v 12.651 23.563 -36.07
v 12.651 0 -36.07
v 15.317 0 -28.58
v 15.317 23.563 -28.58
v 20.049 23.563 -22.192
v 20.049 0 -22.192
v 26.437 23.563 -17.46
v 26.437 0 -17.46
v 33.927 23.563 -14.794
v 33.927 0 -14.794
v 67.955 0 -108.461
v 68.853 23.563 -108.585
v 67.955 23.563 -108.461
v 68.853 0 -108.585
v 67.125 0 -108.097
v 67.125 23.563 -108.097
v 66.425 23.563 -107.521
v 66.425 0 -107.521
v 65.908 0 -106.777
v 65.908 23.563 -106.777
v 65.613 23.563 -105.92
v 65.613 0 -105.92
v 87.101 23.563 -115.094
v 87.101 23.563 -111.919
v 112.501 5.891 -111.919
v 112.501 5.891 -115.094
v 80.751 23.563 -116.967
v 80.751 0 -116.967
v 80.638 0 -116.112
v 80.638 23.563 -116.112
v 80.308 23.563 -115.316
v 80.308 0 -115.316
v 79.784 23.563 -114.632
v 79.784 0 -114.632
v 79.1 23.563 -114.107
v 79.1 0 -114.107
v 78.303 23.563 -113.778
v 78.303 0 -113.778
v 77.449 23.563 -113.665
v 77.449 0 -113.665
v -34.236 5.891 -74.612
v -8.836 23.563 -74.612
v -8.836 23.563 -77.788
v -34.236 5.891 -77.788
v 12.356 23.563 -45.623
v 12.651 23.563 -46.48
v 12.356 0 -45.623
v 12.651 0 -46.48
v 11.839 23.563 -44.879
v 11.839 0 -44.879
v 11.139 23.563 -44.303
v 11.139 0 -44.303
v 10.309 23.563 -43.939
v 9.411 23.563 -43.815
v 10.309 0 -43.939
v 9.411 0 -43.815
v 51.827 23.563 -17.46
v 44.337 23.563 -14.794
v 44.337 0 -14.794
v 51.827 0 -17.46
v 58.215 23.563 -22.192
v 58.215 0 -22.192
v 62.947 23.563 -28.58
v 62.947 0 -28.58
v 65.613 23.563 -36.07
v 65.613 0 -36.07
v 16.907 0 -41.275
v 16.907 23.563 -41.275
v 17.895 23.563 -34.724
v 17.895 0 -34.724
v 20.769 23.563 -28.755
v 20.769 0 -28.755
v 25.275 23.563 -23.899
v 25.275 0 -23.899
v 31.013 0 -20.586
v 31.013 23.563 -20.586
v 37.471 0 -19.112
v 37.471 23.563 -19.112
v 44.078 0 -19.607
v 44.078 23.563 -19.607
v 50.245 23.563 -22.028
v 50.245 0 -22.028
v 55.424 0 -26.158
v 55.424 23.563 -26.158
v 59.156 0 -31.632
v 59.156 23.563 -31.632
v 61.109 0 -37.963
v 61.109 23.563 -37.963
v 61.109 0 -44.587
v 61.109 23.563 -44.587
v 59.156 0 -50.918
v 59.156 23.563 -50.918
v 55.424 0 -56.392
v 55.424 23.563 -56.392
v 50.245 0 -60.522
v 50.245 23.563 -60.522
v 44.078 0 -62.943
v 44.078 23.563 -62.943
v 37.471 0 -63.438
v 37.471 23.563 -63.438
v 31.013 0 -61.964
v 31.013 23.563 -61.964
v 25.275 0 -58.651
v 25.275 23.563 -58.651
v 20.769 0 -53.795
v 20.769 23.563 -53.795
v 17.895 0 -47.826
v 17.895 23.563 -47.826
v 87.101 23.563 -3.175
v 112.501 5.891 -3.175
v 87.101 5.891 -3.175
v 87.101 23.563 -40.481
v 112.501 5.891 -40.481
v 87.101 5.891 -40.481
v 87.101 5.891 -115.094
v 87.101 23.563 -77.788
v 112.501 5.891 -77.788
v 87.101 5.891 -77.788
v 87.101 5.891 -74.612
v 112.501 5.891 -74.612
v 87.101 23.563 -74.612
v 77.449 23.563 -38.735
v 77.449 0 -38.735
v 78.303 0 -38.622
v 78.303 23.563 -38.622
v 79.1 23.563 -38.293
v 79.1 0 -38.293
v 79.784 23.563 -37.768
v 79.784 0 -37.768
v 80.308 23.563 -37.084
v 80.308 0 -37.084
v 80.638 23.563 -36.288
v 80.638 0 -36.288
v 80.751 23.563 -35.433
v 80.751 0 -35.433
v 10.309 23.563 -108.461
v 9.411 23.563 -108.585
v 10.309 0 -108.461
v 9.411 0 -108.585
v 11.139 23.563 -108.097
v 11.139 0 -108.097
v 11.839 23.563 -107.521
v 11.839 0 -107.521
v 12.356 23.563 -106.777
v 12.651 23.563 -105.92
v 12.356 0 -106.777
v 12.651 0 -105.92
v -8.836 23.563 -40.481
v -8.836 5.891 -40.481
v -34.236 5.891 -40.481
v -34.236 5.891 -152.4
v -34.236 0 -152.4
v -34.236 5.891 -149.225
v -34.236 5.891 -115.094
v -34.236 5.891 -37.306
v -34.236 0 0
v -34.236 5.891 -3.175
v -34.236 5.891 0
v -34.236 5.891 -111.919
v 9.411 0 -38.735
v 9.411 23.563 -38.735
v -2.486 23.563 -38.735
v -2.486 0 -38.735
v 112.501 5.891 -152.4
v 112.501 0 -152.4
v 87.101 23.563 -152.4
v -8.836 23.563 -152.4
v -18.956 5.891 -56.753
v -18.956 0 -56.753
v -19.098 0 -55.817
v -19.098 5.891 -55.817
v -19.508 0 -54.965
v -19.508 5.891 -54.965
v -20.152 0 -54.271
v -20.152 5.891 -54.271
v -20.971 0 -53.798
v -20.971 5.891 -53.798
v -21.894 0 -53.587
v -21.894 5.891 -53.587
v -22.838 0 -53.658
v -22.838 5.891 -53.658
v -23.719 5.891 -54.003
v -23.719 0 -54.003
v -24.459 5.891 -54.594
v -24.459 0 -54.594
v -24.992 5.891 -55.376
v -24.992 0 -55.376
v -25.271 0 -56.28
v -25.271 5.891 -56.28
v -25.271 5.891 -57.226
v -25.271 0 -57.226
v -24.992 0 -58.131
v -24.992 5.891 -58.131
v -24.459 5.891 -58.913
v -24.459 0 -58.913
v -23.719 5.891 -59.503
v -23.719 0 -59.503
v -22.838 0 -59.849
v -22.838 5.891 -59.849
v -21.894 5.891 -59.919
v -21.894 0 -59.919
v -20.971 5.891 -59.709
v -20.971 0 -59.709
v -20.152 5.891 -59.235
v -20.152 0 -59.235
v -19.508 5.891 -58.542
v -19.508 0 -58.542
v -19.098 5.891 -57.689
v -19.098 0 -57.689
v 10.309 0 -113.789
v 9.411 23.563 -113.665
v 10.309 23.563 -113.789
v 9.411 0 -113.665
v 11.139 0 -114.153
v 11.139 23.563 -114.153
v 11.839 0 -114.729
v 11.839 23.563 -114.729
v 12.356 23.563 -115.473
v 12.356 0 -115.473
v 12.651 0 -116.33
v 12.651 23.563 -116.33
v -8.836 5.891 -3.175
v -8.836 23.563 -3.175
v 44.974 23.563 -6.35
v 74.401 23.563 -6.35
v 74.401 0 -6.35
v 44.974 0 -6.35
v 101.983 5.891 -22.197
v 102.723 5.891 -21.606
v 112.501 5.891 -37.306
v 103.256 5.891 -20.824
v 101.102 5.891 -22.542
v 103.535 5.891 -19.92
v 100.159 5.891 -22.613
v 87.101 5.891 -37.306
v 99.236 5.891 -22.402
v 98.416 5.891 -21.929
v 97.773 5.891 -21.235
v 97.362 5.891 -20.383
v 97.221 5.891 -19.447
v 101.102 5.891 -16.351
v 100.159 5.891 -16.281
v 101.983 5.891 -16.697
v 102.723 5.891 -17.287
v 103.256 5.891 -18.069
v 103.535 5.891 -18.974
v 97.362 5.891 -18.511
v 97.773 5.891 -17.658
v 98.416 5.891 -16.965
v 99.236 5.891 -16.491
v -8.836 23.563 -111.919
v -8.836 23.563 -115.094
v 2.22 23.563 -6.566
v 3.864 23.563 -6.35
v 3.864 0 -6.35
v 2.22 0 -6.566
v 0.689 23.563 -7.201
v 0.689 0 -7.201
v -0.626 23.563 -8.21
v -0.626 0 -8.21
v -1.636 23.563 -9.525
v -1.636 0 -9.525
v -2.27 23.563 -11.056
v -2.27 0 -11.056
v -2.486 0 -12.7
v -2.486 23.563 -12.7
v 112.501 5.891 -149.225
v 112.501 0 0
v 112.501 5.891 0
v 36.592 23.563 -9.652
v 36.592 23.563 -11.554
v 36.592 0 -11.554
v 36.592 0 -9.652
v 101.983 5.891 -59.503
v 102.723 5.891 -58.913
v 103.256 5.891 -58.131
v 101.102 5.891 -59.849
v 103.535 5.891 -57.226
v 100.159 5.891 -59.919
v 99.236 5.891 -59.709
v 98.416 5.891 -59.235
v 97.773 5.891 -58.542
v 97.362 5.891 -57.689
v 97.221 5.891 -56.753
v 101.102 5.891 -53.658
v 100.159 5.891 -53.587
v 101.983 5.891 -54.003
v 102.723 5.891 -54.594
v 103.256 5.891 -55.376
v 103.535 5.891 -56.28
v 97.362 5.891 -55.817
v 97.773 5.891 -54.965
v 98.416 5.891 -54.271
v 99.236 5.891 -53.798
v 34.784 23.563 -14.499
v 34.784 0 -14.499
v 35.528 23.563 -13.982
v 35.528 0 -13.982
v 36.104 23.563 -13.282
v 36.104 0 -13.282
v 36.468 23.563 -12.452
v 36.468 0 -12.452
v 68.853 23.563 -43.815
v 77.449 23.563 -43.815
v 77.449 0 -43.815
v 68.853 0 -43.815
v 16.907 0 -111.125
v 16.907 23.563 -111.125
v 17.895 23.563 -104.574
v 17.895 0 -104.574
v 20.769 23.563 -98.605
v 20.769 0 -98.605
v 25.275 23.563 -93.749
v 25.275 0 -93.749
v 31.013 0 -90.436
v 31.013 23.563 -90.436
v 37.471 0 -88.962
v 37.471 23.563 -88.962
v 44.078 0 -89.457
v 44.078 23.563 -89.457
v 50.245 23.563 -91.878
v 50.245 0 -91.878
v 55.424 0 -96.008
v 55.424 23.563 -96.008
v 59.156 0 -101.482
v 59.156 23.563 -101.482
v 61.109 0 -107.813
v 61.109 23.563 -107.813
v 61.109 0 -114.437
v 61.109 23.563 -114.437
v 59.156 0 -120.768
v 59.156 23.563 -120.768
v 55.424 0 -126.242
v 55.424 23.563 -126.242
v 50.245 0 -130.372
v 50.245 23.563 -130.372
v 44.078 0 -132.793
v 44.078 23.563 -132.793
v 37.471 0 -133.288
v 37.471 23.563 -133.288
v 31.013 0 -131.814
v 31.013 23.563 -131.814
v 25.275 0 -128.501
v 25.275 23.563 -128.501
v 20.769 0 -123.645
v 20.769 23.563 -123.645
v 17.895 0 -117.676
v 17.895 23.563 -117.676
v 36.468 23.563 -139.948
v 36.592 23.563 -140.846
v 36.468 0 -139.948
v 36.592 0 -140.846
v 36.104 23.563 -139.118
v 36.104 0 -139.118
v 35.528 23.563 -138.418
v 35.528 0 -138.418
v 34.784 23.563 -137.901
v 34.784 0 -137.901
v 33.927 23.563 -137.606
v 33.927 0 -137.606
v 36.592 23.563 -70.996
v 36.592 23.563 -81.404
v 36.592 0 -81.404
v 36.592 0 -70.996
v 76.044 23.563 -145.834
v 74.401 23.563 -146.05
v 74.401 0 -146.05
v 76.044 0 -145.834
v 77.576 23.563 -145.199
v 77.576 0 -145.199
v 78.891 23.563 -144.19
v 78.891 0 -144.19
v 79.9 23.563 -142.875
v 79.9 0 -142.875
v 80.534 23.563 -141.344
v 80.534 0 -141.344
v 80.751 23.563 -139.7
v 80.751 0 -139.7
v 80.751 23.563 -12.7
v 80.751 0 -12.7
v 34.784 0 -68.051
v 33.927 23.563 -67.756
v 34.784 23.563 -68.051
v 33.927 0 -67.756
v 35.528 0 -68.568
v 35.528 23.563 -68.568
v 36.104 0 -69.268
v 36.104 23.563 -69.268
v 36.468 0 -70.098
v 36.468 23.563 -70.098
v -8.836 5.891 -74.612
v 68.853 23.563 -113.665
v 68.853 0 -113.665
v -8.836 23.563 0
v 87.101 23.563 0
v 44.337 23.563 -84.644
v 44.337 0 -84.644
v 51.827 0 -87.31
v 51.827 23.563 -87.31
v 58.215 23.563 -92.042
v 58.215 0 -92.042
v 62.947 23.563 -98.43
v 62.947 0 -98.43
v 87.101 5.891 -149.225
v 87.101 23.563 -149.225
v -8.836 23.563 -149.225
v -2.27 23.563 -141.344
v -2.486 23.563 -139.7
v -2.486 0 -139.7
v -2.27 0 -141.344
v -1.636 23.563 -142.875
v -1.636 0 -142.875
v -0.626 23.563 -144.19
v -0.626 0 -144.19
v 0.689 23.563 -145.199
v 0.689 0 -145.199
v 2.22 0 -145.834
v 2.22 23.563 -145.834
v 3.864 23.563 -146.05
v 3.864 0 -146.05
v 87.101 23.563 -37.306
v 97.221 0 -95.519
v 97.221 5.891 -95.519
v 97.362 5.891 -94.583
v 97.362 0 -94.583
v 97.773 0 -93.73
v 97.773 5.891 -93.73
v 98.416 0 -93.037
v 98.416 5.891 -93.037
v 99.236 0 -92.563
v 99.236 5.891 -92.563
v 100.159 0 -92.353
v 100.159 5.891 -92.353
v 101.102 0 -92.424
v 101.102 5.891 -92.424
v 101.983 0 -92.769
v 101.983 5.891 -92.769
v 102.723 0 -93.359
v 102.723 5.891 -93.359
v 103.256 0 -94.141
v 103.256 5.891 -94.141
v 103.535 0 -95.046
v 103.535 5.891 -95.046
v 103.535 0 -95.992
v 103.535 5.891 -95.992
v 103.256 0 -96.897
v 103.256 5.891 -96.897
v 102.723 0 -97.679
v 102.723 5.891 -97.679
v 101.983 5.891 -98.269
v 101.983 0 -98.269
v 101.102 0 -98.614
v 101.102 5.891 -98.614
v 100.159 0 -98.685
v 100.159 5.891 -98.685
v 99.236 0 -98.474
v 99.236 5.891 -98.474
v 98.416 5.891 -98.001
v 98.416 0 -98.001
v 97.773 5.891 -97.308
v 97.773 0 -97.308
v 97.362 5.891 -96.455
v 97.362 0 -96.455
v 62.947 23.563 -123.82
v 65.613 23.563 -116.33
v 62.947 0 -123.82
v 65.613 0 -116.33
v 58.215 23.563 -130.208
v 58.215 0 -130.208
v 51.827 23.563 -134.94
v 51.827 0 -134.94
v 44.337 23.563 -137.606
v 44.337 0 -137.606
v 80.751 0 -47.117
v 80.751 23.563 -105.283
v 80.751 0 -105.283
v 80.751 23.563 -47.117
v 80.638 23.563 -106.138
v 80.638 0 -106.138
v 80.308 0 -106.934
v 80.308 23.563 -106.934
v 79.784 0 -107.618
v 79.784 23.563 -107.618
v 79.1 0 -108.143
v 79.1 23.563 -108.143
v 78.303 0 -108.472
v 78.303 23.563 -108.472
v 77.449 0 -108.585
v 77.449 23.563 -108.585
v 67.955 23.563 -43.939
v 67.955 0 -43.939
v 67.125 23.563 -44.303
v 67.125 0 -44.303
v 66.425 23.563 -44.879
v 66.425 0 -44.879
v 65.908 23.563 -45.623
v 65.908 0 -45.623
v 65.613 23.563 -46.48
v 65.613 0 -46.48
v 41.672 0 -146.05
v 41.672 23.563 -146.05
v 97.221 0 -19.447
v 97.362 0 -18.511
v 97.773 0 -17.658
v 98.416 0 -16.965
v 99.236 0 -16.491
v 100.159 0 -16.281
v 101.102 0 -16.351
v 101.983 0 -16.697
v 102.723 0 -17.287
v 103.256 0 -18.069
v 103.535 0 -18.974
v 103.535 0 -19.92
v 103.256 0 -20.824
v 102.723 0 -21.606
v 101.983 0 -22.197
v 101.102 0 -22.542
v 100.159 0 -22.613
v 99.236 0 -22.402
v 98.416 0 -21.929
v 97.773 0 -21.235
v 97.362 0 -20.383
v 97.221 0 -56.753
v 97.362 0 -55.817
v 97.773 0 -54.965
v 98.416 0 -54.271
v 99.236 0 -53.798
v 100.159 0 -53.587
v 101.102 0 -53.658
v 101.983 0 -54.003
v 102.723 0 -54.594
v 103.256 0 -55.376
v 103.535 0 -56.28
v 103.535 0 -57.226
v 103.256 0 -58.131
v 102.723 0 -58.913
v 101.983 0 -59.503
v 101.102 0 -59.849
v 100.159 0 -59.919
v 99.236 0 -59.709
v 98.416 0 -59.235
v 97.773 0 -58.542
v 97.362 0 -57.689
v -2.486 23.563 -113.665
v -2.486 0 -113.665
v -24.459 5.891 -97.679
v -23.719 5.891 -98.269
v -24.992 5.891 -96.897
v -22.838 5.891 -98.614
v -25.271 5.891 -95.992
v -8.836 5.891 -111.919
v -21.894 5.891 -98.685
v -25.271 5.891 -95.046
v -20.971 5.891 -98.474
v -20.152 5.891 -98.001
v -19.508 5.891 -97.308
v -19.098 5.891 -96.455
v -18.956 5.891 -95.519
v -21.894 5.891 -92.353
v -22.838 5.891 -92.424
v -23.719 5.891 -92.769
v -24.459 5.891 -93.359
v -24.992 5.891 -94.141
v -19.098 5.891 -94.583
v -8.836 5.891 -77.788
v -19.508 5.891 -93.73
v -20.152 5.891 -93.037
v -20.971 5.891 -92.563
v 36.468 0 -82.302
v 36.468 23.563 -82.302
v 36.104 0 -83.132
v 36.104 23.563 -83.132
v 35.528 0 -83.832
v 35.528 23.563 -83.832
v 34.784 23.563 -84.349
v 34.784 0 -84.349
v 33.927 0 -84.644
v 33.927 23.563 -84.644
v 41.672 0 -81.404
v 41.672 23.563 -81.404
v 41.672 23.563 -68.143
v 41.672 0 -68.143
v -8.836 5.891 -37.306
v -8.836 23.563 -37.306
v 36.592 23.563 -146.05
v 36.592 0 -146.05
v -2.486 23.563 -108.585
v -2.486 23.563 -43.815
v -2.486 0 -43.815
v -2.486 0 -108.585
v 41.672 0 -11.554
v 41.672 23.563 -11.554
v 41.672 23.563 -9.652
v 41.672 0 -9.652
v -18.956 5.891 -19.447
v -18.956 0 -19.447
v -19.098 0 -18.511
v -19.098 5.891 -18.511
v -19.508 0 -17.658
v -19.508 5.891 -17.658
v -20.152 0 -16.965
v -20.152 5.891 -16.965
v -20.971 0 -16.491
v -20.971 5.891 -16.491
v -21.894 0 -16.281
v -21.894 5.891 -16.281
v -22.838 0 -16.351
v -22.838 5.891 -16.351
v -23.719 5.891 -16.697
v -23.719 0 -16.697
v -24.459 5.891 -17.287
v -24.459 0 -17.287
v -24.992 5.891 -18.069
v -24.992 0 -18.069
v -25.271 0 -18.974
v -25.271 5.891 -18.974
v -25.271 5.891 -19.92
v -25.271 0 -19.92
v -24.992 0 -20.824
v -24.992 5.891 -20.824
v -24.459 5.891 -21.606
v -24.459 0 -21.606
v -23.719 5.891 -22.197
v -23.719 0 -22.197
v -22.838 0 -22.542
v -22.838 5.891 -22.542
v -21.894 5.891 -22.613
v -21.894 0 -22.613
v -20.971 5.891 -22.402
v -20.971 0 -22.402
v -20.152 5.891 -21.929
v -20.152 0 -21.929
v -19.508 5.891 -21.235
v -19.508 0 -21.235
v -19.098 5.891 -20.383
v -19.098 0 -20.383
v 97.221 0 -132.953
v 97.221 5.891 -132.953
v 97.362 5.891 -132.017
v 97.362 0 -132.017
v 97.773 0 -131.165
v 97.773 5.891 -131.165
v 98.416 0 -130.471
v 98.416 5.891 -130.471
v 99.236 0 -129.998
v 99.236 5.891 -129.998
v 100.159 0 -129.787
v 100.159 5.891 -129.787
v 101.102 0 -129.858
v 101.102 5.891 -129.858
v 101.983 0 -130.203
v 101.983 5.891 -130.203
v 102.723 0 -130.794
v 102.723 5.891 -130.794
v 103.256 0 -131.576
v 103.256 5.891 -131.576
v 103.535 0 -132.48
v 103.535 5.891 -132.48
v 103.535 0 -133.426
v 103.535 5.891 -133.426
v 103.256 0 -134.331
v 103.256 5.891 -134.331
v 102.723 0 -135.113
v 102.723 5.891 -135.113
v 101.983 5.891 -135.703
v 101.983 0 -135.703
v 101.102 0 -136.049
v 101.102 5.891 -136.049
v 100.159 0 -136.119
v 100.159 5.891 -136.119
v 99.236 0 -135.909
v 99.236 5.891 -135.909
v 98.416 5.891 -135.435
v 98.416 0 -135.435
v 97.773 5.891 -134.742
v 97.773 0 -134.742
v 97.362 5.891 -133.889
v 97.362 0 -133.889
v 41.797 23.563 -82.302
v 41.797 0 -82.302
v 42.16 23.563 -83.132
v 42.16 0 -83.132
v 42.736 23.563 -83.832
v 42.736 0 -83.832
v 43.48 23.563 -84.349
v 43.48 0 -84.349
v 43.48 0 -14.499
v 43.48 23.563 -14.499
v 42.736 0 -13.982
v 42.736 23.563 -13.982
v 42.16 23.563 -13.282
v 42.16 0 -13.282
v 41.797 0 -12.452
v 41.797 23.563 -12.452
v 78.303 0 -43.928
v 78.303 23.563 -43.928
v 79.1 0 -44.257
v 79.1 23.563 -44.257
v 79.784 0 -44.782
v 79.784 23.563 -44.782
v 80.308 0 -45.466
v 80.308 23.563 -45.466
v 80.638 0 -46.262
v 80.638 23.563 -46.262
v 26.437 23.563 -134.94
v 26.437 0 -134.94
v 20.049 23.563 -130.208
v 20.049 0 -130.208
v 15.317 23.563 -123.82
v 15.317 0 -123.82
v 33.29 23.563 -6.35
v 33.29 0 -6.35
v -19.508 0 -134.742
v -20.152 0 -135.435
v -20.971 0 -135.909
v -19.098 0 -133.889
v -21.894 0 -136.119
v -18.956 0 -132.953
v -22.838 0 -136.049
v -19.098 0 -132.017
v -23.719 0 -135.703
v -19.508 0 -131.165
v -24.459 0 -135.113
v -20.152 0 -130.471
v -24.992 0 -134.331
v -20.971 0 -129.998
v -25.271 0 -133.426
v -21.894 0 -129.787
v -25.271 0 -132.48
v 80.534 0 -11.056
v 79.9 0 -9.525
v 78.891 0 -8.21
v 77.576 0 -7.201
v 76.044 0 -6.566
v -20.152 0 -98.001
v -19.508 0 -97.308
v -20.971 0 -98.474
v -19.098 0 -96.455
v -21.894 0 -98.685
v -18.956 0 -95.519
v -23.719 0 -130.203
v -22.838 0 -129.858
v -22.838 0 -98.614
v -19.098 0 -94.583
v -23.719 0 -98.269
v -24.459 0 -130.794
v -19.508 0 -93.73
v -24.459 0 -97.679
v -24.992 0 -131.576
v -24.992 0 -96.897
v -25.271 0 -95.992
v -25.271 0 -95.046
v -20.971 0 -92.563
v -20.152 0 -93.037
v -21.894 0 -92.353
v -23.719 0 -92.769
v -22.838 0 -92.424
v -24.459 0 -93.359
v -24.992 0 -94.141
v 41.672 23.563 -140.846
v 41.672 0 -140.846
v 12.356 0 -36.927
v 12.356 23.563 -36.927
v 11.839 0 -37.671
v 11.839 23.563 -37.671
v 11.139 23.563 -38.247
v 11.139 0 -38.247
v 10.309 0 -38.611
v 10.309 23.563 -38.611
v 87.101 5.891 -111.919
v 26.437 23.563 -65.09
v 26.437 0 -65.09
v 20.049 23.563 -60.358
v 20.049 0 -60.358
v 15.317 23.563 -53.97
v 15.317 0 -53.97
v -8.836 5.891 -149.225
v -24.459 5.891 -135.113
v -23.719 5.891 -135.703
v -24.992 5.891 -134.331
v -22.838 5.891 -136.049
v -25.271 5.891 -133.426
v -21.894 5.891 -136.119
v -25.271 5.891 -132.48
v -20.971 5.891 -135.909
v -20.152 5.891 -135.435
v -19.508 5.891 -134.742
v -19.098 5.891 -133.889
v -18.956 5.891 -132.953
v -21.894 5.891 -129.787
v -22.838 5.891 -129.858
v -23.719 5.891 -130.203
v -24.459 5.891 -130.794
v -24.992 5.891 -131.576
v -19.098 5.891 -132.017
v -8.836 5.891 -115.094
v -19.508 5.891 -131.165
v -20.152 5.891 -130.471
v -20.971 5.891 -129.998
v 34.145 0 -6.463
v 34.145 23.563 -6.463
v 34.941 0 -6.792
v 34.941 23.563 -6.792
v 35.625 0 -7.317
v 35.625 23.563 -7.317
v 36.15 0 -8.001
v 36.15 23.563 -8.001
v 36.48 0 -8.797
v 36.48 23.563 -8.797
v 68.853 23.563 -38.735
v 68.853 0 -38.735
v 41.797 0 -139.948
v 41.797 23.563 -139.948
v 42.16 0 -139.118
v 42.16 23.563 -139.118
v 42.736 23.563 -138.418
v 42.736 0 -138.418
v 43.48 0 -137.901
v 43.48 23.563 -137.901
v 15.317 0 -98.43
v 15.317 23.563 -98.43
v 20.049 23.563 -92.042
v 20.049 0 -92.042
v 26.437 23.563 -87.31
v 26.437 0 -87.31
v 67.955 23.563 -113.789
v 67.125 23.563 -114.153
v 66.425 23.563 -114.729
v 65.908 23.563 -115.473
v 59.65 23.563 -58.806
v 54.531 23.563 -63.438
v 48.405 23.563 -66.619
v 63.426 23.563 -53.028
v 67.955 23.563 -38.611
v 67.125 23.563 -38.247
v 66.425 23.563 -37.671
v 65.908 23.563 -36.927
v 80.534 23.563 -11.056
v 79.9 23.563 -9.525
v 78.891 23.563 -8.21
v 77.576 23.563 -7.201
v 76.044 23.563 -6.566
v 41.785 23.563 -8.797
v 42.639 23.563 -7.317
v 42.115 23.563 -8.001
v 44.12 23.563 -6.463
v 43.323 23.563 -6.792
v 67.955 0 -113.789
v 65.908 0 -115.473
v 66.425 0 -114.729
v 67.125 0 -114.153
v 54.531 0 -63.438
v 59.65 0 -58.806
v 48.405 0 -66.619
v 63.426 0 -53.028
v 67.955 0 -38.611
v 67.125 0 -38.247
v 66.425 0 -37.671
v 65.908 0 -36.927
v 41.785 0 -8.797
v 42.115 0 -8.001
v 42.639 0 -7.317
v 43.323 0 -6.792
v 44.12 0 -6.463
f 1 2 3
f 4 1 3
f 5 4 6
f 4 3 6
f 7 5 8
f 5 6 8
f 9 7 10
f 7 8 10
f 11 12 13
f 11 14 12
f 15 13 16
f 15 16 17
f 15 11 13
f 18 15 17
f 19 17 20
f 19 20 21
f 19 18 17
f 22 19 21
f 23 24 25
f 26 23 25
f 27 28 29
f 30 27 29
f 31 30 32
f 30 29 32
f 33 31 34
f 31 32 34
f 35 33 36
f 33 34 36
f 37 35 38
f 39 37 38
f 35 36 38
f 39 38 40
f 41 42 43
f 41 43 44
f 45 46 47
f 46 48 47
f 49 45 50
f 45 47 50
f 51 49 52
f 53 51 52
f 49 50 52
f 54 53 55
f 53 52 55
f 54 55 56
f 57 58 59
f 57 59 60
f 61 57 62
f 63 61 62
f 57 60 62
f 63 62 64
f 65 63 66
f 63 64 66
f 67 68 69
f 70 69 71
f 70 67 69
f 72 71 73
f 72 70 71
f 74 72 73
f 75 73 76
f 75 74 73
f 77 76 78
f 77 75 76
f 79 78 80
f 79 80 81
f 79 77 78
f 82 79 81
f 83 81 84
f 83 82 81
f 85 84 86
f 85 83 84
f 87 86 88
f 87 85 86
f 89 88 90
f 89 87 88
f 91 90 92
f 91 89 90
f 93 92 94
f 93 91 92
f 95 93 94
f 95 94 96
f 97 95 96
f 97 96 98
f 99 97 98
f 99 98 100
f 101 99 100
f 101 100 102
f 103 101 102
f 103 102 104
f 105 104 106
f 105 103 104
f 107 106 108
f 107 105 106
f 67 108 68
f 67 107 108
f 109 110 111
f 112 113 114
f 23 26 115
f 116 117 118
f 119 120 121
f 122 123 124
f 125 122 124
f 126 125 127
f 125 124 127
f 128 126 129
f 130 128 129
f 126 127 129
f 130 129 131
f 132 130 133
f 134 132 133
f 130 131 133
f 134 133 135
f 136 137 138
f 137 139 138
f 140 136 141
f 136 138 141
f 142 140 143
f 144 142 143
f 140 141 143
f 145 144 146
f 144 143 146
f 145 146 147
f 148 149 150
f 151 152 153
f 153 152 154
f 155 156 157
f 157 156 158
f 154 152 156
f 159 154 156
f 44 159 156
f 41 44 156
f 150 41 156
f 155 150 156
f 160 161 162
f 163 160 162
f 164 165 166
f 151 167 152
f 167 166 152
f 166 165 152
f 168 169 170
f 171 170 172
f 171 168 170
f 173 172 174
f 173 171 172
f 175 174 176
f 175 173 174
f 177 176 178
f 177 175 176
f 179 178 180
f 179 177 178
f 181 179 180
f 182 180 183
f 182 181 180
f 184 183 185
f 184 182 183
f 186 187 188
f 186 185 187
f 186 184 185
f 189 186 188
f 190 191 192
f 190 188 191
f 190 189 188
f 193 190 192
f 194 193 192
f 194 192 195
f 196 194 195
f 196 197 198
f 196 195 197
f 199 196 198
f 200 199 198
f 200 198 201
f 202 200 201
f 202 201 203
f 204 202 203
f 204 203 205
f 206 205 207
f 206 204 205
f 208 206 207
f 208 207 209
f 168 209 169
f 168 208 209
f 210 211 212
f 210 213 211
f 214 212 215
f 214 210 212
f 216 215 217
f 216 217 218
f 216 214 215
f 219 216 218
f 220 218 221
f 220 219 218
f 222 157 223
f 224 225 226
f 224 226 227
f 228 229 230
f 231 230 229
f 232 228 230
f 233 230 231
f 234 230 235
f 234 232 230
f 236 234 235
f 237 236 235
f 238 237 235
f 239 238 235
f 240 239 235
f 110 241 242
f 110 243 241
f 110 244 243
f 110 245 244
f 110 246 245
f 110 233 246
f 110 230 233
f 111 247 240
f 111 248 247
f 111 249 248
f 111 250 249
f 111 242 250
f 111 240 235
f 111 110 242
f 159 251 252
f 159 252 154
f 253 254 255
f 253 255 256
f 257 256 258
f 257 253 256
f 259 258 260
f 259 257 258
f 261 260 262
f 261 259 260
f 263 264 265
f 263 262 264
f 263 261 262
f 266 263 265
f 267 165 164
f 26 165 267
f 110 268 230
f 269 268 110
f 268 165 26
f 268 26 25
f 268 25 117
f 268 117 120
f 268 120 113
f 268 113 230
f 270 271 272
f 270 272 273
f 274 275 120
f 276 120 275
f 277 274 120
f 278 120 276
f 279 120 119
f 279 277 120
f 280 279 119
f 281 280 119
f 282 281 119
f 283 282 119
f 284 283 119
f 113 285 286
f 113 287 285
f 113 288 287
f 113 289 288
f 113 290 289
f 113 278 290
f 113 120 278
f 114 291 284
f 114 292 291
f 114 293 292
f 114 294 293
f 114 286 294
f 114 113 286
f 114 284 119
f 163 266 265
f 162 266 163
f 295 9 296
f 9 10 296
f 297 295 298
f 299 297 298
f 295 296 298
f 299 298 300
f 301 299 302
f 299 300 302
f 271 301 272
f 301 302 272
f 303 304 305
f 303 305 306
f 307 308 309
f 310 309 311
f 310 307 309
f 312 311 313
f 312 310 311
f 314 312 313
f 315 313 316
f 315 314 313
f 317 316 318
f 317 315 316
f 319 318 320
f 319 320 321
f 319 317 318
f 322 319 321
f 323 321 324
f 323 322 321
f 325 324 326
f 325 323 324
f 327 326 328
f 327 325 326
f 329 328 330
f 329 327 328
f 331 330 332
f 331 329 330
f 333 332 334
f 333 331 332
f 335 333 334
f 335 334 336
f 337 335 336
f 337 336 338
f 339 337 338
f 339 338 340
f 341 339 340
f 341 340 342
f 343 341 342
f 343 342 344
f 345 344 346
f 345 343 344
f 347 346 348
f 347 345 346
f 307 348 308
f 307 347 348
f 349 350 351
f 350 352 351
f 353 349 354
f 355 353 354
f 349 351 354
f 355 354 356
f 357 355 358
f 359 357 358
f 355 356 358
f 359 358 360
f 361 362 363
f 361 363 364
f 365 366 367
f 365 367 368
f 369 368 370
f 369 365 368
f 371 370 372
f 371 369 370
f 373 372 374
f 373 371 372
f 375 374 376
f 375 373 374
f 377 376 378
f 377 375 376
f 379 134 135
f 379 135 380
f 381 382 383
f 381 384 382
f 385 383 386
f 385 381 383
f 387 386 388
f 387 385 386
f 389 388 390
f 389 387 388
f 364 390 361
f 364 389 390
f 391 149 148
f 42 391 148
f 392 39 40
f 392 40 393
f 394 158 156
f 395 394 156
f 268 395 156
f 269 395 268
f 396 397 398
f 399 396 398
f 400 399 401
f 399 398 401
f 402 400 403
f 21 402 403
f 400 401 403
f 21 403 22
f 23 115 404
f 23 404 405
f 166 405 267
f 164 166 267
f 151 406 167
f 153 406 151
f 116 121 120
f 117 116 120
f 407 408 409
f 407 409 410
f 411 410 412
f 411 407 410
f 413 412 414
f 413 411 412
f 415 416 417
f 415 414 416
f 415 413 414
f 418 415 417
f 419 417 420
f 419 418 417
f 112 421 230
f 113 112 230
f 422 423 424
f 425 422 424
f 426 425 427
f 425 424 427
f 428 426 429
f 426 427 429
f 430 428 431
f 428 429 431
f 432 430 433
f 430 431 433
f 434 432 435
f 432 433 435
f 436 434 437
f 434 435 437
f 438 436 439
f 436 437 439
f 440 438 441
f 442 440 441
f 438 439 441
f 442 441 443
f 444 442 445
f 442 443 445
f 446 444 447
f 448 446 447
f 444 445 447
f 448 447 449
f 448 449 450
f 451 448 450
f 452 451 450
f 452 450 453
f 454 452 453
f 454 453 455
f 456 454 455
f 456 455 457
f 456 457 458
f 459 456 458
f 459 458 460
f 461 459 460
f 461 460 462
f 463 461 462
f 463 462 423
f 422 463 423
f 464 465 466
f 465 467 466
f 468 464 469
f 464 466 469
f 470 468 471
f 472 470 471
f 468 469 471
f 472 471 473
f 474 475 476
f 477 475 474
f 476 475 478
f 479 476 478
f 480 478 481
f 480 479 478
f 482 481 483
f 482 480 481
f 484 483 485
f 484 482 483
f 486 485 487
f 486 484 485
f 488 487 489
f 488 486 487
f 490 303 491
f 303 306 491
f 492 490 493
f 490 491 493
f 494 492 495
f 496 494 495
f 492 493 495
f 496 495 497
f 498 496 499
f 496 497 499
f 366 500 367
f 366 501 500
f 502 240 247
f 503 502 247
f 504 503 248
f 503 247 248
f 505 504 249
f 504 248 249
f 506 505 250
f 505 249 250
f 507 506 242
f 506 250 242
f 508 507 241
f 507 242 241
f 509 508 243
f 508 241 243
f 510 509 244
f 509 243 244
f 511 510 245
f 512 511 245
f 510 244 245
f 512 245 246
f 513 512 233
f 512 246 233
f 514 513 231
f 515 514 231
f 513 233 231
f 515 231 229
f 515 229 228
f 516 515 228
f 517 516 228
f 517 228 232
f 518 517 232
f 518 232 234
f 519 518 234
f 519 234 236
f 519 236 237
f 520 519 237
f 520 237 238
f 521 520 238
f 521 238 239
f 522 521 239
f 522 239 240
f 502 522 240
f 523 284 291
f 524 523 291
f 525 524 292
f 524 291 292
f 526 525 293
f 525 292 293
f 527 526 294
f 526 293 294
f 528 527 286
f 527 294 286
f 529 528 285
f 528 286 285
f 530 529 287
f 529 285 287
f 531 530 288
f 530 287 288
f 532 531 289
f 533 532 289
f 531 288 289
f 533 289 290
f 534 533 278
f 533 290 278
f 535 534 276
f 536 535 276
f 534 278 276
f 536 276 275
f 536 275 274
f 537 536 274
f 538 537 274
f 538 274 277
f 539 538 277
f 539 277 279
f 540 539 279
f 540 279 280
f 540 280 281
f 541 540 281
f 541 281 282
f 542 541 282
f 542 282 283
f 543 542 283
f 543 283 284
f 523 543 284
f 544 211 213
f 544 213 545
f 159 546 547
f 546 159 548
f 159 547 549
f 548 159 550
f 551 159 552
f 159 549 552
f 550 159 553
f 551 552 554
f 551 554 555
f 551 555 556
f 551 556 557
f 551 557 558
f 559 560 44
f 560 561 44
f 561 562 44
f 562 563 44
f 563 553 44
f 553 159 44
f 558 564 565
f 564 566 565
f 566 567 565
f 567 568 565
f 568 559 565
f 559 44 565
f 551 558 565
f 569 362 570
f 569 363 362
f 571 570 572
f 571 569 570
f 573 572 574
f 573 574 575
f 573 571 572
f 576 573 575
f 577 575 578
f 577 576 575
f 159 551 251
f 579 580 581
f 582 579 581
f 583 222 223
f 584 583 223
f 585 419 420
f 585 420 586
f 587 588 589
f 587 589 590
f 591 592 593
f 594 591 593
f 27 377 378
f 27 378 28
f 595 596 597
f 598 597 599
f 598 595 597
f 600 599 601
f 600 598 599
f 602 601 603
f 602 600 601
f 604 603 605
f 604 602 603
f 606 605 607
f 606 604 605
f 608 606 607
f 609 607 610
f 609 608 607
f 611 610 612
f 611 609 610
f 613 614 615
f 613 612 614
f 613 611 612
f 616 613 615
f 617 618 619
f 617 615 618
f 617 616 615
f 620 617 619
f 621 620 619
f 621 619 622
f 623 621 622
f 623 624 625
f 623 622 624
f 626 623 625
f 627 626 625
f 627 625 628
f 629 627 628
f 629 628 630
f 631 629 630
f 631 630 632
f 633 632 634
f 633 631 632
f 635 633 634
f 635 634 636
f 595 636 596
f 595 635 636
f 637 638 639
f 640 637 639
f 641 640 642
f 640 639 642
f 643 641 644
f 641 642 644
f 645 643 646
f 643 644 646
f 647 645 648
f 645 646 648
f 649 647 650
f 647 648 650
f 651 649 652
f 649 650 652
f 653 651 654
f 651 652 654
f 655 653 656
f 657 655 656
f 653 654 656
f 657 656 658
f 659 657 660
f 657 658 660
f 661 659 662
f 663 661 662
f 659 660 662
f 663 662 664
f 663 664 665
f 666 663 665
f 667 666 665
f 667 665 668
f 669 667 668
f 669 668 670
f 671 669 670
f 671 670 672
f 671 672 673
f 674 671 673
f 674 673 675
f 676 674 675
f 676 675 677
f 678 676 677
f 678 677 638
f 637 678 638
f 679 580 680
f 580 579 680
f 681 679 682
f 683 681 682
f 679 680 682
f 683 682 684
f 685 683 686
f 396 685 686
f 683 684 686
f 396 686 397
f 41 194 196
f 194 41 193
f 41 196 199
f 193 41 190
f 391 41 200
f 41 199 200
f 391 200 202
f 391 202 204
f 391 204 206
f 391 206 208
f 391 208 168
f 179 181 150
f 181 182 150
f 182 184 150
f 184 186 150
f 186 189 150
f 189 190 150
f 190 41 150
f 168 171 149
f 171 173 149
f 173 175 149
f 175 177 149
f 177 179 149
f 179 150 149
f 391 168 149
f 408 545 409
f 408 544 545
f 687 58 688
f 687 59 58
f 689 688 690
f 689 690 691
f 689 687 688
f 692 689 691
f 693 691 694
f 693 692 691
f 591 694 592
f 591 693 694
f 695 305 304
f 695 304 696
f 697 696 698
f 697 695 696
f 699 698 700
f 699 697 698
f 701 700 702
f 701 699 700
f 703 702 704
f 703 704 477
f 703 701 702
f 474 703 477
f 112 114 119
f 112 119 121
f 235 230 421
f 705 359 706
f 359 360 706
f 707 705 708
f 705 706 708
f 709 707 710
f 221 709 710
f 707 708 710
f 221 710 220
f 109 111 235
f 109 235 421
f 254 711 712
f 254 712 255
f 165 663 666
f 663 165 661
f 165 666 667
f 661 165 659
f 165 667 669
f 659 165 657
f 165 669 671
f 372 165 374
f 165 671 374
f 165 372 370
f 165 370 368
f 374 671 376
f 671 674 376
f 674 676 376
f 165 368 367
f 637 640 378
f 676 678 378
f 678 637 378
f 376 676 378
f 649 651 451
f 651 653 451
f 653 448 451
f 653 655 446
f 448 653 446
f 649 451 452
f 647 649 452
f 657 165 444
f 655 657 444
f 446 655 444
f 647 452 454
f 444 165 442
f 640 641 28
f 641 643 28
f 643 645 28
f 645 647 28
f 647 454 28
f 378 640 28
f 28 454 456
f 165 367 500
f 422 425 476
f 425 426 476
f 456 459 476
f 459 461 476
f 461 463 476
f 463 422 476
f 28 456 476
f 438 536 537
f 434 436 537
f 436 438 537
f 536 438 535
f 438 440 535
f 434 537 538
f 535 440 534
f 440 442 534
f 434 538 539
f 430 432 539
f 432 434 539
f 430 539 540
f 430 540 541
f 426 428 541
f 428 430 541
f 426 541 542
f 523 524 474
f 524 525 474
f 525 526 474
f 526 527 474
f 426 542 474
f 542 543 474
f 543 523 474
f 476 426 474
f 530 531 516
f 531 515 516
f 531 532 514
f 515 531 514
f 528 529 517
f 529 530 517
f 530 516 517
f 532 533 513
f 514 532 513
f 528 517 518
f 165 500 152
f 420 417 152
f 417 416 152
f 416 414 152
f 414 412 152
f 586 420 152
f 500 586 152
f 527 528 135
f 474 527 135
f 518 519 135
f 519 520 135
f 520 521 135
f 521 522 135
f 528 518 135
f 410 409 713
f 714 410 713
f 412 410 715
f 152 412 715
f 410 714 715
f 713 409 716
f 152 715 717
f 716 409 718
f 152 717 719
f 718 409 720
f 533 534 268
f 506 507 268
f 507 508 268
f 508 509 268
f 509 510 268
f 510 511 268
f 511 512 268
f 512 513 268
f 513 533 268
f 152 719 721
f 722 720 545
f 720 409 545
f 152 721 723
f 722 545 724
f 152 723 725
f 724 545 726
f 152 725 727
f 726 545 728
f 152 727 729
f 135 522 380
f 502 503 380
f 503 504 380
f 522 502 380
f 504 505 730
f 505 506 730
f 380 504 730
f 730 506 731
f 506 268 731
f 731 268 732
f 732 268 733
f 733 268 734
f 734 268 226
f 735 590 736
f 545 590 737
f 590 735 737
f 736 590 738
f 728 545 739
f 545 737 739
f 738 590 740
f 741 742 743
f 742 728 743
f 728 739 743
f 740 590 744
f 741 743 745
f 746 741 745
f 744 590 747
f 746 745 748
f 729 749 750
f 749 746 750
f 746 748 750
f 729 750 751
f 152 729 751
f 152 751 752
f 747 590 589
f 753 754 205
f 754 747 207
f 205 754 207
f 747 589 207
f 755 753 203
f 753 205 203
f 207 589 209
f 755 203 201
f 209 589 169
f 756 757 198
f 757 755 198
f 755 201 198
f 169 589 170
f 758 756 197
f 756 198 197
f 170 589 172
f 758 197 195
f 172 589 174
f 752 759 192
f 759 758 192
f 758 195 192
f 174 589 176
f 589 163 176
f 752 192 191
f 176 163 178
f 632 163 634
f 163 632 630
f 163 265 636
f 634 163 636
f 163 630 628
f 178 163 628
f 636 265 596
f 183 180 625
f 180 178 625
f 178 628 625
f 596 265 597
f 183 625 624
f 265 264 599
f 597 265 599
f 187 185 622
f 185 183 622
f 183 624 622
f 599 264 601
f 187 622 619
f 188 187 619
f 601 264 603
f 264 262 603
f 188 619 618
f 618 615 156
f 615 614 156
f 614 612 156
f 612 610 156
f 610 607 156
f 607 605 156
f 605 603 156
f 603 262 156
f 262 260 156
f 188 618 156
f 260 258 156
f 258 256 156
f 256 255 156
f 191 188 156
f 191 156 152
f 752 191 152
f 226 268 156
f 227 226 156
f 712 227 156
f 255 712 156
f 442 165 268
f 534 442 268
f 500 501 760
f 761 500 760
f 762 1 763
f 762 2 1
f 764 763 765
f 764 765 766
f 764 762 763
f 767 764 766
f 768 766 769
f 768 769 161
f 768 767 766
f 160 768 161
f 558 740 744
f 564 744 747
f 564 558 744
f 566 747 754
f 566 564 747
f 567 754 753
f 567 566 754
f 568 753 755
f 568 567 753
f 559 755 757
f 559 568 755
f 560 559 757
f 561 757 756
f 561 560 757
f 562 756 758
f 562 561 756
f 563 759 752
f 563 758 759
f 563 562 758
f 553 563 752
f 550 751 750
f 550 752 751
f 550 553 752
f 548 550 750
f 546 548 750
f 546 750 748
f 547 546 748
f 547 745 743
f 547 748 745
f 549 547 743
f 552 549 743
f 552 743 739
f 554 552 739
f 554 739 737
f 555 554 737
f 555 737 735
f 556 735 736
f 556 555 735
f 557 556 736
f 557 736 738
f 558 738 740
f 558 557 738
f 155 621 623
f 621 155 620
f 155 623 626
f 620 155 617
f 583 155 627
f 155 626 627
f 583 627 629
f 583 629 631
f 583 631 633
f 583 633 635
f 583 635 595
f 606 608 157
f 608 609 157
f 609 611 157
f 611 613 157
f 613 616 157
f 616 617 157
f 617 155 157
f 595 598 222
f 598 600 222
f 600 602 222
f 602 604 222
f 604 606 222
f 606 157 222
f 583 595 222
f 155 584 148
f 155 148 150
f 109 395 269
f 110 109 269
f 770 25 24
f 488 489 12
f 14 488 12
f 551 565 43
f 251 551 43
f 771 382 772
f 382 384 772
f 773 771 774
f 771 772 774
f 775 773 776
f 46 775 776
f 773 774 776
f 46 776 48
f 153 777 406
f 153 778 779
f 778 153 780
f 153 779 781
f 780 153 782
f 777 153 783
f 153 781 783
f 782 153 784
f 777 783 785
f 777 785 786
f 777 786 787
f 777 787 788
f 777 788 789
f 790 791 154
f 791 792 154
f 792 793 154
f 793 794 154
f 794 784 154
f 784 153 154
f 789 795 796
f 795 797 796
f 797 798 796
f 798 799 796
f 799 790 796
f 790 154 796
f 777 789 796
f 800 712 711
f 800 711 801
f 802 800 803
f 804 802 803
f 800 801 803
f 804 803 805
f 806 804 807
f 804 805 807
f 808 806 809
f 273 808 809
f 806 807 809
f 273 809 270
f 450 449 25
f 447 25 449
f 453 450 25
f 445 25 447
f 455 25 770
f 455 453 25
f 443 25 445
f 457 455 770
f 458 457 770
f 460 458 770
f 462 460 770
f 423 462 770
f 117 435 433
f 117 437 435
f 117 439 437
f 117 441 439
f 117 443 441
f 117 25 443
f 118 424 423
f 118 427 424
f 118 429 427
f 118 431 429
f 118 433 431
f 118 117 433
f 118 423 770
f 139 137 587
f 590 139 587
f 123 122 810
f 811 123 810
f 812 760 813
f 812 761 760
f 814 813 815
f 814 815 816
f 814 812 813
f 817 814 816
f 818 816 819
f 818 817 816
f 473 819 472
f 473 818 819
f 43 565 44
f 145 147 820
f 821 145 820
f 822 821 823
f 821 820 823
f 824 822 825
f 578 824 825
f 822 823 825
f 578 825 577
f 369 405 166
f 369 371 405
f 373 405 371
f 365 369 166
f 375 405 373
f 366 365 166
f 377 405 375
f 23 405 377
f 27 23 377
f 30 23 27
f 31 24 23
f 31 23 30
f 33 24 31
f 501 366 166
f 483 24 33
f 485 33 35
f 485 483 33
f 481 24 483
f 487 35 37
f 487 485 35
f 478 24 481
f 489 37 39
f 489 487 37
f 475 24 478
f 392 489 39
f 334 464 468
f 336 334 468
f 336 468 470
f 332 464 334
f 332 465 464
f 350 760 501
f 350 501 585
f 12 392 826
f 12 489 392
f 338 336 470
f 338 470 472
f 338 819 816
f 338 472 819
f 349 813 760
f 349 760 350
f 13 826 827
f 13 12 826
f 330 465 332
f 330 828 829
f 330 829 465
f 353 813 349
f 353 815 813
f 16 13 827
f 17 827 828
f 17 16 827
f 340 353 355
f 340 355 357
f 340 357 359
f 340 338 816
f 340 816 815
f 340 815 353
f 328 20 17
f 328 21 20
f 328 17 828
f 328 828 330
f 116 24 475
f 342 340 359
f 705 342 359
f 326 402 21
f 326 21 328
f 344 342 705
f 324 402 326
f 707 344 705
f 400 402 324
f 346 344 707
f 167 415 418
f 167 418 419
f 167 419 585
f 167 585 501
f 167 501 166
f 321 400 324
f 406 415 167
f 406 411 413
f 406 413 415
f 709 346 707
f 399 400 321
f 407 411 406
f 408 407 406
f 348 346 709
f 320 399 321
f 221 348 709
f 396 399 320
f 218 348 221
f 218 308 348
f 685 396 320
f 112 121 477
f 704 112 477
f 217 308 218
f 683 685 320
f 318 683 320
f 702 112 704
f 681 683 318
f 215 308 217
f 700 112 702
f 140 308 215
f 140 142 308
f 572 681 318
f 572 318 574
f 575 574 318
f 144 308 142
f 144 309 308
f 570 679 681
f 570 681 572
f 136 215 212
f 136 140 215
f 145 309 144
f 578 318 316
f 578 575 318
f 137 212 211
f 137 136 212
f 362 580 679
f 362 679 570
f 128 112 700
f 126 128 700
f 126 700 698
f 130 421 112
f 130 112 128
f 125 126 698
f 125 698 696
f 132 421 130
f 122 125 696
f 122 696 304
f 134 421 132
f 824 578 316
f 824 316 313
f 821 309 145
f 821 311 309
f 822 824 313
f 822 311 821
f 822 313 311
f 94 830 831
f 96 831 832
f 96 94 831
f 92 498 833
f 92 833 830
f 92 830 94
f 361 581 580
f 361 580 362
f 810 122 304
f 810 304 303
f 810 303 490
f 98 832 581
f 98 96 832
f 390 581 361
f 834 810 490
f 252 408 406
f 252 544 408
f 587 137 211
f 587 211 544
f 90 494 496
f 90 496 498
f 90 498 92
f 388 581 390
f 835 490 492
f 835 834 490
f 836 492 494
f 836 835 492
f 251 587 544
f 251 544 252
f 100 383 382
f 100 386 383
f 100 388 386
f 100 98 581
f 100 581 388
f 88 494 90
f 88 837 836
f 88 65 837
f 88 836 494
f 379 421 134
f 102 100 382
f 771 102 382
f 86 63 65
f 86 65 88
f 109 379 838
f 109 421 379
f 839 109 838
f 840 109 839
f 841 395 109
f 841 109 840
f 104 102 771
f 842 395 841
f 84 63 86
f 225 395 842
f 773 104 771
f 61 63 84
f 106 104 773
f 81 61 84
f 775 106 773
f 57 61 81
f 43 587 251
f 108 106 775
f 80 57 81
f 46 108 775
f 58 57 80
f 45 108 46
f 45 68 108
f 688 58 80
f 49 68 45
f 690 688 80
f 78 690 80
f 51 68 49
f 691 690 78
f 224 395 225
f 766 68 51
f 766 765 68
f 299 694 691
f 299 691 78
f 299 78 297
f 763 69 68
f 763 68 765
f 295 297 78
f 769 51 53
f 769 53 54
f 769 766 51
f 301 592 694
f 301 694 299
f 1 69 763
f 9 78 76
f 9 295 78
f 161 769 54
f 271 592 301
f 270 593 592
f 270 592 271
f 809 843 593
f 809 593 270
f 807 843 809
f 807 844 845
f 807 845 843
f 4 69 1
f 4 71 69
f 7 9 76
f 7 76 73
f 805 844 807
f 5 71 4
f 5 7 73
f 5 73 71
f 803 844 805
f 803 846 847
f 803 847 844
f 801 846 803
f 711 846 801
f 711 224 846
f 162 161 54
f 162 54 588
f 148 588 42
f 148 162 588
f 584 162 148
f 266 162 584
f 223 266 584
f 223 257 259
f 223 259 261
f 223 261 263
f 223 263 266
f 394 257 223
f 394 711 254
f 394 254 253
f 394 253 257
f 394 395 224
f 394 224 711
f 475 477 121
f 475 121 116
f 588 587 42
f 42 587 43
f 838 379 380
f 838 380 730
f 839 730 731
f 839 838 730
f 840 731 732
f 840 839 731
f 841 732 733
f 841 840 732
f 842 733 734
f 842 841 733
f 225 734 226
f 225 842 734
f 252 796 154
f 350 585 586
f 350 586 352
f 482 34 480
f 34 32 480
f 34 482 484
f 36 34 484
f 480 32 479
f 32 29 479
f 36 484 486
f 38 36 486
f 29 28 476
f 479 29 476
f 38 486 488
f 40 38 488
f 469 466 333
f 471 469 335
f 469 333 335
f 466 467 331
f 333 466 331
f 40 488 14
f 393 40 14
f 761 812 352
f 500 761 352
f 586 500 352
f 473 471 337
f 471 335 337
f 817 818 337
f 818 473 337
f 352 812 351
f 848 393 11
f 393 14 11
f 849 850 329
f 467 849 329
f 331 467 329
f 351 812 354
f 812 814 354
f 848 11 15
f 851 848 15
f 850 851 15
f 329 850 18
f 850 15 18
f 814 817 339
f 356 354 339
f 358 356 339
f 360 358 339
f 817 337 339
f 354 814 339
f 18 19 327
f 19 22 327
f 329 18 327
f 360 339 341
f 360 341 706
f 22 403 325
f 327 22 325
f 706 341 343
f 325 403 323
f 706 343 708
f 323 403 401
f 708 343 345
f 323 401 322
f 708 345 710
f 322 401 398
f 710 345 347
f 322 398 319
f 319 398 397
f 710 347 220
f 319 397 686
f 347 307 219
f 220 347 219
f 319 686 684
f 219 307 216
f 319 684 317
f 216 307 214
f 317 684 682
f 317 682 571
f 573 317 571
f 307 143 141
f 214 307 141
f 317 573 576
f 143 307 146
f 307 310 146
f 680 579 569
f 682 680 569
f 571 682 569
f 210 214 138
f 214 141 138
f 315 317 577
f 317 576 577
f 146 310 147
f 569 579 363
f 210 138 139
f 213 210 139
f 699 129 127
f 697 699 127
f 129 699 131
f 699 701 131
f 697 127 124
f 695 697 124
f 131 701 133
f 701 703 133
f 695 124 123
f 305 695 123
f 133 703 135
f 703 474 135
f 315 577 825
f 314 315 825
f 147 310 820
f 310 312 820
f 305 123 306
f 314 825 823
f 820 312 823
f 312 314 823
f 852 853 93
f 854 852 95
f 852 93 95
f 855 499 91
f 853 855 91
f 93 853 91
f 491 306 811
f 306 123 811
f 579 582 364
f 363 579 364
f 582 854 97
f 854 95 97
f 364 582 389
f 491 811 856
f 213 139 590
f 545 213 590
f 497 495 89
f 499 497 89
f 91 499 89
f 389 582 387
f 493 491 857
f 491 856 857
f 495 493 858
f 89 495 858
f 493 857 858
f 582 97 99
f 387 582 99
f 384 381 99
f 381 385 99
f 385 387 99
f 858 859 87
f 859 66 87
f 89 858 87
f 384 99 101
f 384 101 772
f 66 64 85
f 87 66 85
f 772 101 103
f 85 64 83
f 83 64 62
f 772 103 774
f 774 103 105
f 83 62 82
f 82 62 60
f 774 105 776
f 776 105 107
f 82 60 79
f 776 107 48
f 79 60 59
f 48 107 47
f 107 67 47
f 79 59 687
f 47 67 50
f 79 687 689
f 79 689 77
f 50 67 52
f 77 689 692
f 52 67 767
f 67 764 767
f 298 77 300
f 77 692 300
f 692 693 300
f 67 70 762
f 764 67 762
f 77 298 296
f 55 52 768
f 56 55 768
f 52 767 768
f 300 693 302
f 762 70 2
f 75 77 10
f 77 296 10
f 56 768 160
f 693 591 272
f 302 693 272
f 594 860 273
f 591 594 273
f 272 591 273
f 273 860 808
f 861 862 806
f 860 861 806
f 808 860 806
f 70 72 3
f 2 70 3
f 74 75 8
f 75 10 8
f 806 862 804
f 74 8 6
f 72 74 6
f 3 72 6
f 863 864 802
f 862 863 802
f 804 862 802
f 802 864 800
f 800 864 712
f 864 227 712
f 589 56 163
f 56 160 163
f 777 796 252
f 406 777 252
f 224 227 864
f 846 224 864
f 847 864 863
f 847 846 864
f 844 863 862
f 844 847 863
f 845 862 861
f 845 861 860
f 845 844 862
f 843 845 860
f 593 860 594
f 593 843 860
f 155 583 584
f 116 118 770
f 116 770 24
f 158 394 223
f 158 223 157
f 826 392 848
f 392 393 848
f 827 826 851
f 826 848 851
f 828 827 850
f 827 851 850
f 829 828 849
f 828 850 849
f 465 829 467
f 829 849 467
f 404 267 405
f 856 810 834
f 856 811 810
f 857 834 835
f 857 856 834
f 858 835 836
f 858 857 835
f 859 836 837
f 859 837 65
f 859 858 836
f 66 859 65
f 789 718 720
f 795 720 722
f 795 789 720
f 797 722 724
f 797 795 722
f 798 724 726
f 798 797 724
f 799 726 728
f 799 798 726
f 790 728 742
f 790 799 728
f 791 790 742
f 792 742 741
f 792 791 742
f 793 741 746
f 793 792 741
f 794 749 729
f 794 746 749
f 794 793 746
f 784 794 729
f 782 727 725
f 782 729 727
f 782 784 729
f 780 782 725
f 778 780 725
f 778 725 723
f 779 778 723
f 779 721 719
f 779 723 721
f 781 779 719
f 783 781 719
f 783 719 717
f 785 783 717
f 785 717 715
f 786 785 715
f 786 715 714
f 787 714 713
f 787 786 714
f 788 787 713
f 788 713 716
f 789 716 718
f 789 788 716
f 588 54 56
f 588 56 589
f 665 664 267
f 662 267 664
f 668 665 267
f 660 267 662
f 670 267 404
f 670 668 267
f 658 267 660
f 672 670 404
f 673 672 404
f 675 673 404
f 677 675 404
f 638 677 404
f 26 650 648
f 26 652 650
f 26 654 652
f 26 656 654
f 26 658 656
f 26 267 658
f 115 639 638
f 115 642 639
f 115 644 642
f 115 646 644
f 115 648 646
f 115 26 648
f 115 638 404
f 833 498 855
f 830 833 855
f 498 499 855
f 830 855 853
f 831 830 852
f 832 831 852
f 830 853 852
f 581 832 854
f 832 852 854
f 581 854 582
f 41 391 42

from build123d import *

# Parameters (mm, degrees)
EXTRUDE1_DEPTH        = 152.4
EXTRUDE2_DEPTH        = 3.175
SKETCH8_R             = 3.175
EXTRUDE4_DEPTH        = 191.248536063
LPATTERN1_COUNT       = 5
LPATTERN1_PITCH       = 37.30625
MIRROR5_COPY_1_DEPTH  = 3.175
MIRROR5_COPY_2_DEPTH  = 3.175
MIRROR5_COPY_3_DEPTH  = 3.175
MIRROR5_COPY_4_DEPTH  = 3.175
EXTRUDE5_DEPTH        = 25.4
EXTRUDE_THIN2_START   = -23.563494
SKETCH12_R            = 26.9875
SKETCH12_R_2          = 22.225
EXTRUDE_THIN2_DEPTH   = 23.563494
EXTRUDE_THIN2_2_DEPTH = 23.563494
SKETCH13_W            = 17.78
SKETCH13_H            = 5.08
SKETCH13_W_2          = 5.08
SKETCH13_H_2          = 13.97
SKETCH13_H_3          = 20.32
SKETCH13_W_3          = 19.05
SKETCH13_W_4          = 16.51
SKETCH13_H_4          = 12.685889217
SKETCH13_W_5          = 15.24
EXTRUDE6_DEPTH        = 23.563494
FILLET1_R             = 3.302


with BuildPart() as part:
    # Sketch1 → Extrude1 (new body)
    with BuildSketch(Plane.XY):
        Polygon((39.132231405, 0), (112.500773126, 0), (112.500773126, 5.890873545), (87.100773126, 5.890873545), (87.100773126, 23.563494179), (39.132231405, 23.563494179), align=None)
    extrude1 = extrude(amount=-EXTRUDE1_DEPTH)

    # Mirror1: Extrude1 across plane
    add(extrude1.mirror(Plane(origin=(39.132231405, 23.563494179, -152.4), x_dir=(0, 0, 1), z_dir=(-1, 0, 0))))

    # Sketch6 → Extrude2 (add)
    with BuildSketch(Plane.XY):
        Polygon((87.100773126, 23.563494179), (112.500773126, 5.890873545), (87.100773126, 5.890873545), align=None)
    extrude2 = extrude(amount=-EXTRUDE2_DEPTH)

    # Sketch8 → Extrude4 (cut, through all)
    with BuildSketch(Plane(origin=(0, 5.890873545, 0), x_dir=(-1, 0, 0), z_dir=(0, 1, 0))):
        with Locations((-100.395913074, -19.446875)):
            Circle(SKETCH8_R)
        with Locations((-100.395913074, -56.753125)):
            Circle(SKETCH8_R)
        with Locations((-100.395913074, -95.518958881)):
            Circle(SKETCH8_R)
        with Locations((-100.395913074, -132.953125)):
            Circle(SKETCH8_R)
    extrude4 = extrude(amount=-EXTRUDE4_DEPTH, mode=Mode.SUBTRACT)

    # LPattern1: Extrude2 ×5
    with Locations(*[(0, 0, -i * LPATTERN1_PITCH) for i in range(1, LPATTERN1_COUNT)]):
        add(extrude2)

    # Mirror5: Extrude2, Extrude4 across plane
    add(extrude2.mirror(Plane(origin=(39.132231405, 0, 0), x_dir=(0, 0, 1), z_dir=(1, 0, 0))))
    add(extrude4.mirror(Plane(origin=(39.132231405, 0, 0), x_dir=(0, 0, 1), z_dir=(1, 0, 0))), mode=Mode.SUBTRACT)

    # Mirror5 copy 1 sketch → Mirror5 copy 1 (add)
    with BuildSketch(Plane(origin=(78.264462809, 0, -37.30625), x_dir=(-1, 0, 0), z_dir=(0, 0, 1))):
        Polygon((87.100773126, -23.563494179), (112.500773126, -5.890873545), (87.100773126, -5.890873545), align=None)
    extrude(amount=-MIRROR5_COPY_1_DEPTH)

    # Mirror5 copy 2 sketch → Mirror5 copy 2 (add)
    with BuildSketch(Plane(origin=(78.264462809, 0, -74.6125), x_dir=(-1, 0, 0), z_dir=(0, 0, 1))):
        Polygon((87.100773126, -23.563494179), (112.500773126, -5.890873545), (87.100773126, -5.890873545), align=None)
    extrude(amount=-MIRROR5_COPY_2_DEPTH)

    # Mirror5 copy 3 sketch → Mirror5 copy 3 (add)
    with BuildSketch(Plane(origin=(78.264462809, 0, -111.91875), x_dir=(-1, 0, 0), z_dir=(0, 0, 1))):
        Polygon((87.100773126, -23.563494179), (112.500773126, -5.890873545), (87.100773126, -5.890873545), align=None)
    extrude(amount=-MIRROR5_COPY_3_DEPTH)

    # Mirror5 copy 4 sketch → Mirror5 copy 4 (add)
    with BuildSketch(Plane(origin=(78.264462809, 0, -149.225), x_dir=(-1, 0, 0), z_dir=(0, 0, 1))):
        Polygon((87.100773126, -23.563494179), (112.500773126, -5.890873545), (87.100773126, -5.890873545), align=None)
    extrude(amount=-MIRROR5_COPY_4_DEPTH)

    # Sketch11 → Extrude5 (cut)
    with BuildSketch(Plane(origin=(0, 23.563494179, 0), x_dir=(-1, 0, 0), z_dir=(0, 1, 0))):
        with BuildLine():
            Line((-80.750773126, -139.7), (-80.750773126, -12.7))
            ThreePointArc((-80.750773126, -12.7), (-78.890901187, -8.209871939), (-74.400773126, -6.35))
            Line((-74.400773126, -6.35), (-3.863689683, -6.35))
            ThreePointArc((-3.863689683, -6.35), (0.626438378, -8.209871939), (2.486310317, -12.7))
            Line((2.486310317, -12.7), (2.486310317, -139.7))
            ThreePointArc((2.486310317, -139.7), (0.626438378, -144.190128061), (-3.863689683, -146.05))
            Line((-3.863689683, -146.05), (-74.400773126, -146.05))
            ThreePointArc((-74.400773126, -146.05), (-78.890901187, -144.190128061), (-80.750773126, -139.7))
        make_face()
    extrude(amount=-EXTRUDE5_DEPTH, mode=Mode.SUBTRACT)



with BuildPart() as body_2:
    # Sketch12 → Extrude-Thin2 (new body)
    with BuildSketch(Plane(origin=(0, 23.563494179, 0), x_dir=(-1, 0, 0), z_dir=(0, 1, 0)).offset(EXTRUDE_THIN2_START)):
        with Locations((-39.132231405, -41.275)):
            Circle(SKETCH12_R)
        with Locations((-39.132231405, -41.275)):
            Circle(SKETCH12_R_2, mode=Mode.SUBTRACT)
    extrude(amount=EXTRUDE_THIN2_DEPTH)


with BuildPart() as body_3:
    # Sketch12 → Extrude-Thin2 2 (new body)
    with BuildSketch(Plane(origin=(0, 23.563494179, 0), x_dir=(-1, 0, 0), z_dir=(0, 1, 0)).offset(EXTRUDE_THIN2_START)):
        with Locations((-39.132231405, -111.125)):
            Circle(SKETCH12_R)
        with Locations((-39.132231405, -111.125)):
            Circle(SKETCH12_R_2, mode=Mode.SUBTRACT)
    extrude(amount=EXTRUDE_THIN2_2_DEPTH)


with BuildPart() as part_1:
    add(part.part)

    add(body_2.part)  # Extrude6 merges body 2

    add(body_3.part)  # Extrude6 merges body 3
    # Sketch13 → Extrude6 (add)
    with BuildSketch(Plane(origin=(0, 23.563494179, 0), x_dir=(-1, 0, 0), z_dir=(0, 1, 0))):
        with Locations((-71.860773126, -41.275)):
            Rectangle(SKETCH13_W, SKETCH13_H)
        with Locations((-39.132231405, -9.8425)):
            Rectangle(SKETCH13_W_2, SKETCH13_H_2)
        with Locations((-39.132231405, -76.5175)):
            Rectangle(SKETCH13_W_2, SKETCH13_H_3)
        with Locations((-5.159731405, -41.275)):
            Rectangle(SKETCH13_W_3, SKETCH13_H)
        with Locations((-5.337623018, -111.125)):
            Rectangle(SKETCH13_W_4, SKETCH13_H)
        with Locations((-39.132231405, -142.266392139)):
            Rectangle(SKETCH13_W_2, SKETCH13_H_4)
        with Locations((-73.130773126, -111.125)):
            Rectangle(SKETCH13_W_5, SKETCH13_H)
    extrude(amount=-EXTRUDE6_DEPTH)

    # Fillet1
    fillet1_edges = [part_1.edges().sort_by_distance(p)[0] for p in [
        (36.592231405, 11.781747179, -6.35),
        (41.672231405, 11.781747179, -6.35),
        (36.592231405, 11.781747179, -14.407295292),
        (41.672231405, 11.781747179, -14.407295292),
        (36.592231405, 11.781747179, -68.142704708),
        (36.592231405, 11.781747179, -84.257295292),
        (41.672231405, 11.781747179, -84.257295292),
        (41.672231405, 11.781747179, -137.992704708),
        (36.592231405, 11.781747179, -137.992704708),
        (12.264526697, 11.781747179, -108.585),
        (12.264526697, 11.781747179, -113.665),
        (65.999936112, 11.781747179, -113.665),
        (65.999936112, 11.781747179, -108.585),
        (80.750773126, 11.781747179, -113.665),
        (80.750773126, 11.781747179, -108.585),
        (12.264526697, 11.781747179, -38.735),
        (12.264526697, 11.781747179, -43.815),
        (65.999936112, 11.781747179, -43.815),
        (80.750773126, 11.781747179, -43.815),
        (65.999936112, 11.781747179, -38.735),
        (80.750773126, 11.781747179, -38.735),
    ]]
    fillet(fillet1_edges, radius=FILLET1_R)


solid = part_1.part
